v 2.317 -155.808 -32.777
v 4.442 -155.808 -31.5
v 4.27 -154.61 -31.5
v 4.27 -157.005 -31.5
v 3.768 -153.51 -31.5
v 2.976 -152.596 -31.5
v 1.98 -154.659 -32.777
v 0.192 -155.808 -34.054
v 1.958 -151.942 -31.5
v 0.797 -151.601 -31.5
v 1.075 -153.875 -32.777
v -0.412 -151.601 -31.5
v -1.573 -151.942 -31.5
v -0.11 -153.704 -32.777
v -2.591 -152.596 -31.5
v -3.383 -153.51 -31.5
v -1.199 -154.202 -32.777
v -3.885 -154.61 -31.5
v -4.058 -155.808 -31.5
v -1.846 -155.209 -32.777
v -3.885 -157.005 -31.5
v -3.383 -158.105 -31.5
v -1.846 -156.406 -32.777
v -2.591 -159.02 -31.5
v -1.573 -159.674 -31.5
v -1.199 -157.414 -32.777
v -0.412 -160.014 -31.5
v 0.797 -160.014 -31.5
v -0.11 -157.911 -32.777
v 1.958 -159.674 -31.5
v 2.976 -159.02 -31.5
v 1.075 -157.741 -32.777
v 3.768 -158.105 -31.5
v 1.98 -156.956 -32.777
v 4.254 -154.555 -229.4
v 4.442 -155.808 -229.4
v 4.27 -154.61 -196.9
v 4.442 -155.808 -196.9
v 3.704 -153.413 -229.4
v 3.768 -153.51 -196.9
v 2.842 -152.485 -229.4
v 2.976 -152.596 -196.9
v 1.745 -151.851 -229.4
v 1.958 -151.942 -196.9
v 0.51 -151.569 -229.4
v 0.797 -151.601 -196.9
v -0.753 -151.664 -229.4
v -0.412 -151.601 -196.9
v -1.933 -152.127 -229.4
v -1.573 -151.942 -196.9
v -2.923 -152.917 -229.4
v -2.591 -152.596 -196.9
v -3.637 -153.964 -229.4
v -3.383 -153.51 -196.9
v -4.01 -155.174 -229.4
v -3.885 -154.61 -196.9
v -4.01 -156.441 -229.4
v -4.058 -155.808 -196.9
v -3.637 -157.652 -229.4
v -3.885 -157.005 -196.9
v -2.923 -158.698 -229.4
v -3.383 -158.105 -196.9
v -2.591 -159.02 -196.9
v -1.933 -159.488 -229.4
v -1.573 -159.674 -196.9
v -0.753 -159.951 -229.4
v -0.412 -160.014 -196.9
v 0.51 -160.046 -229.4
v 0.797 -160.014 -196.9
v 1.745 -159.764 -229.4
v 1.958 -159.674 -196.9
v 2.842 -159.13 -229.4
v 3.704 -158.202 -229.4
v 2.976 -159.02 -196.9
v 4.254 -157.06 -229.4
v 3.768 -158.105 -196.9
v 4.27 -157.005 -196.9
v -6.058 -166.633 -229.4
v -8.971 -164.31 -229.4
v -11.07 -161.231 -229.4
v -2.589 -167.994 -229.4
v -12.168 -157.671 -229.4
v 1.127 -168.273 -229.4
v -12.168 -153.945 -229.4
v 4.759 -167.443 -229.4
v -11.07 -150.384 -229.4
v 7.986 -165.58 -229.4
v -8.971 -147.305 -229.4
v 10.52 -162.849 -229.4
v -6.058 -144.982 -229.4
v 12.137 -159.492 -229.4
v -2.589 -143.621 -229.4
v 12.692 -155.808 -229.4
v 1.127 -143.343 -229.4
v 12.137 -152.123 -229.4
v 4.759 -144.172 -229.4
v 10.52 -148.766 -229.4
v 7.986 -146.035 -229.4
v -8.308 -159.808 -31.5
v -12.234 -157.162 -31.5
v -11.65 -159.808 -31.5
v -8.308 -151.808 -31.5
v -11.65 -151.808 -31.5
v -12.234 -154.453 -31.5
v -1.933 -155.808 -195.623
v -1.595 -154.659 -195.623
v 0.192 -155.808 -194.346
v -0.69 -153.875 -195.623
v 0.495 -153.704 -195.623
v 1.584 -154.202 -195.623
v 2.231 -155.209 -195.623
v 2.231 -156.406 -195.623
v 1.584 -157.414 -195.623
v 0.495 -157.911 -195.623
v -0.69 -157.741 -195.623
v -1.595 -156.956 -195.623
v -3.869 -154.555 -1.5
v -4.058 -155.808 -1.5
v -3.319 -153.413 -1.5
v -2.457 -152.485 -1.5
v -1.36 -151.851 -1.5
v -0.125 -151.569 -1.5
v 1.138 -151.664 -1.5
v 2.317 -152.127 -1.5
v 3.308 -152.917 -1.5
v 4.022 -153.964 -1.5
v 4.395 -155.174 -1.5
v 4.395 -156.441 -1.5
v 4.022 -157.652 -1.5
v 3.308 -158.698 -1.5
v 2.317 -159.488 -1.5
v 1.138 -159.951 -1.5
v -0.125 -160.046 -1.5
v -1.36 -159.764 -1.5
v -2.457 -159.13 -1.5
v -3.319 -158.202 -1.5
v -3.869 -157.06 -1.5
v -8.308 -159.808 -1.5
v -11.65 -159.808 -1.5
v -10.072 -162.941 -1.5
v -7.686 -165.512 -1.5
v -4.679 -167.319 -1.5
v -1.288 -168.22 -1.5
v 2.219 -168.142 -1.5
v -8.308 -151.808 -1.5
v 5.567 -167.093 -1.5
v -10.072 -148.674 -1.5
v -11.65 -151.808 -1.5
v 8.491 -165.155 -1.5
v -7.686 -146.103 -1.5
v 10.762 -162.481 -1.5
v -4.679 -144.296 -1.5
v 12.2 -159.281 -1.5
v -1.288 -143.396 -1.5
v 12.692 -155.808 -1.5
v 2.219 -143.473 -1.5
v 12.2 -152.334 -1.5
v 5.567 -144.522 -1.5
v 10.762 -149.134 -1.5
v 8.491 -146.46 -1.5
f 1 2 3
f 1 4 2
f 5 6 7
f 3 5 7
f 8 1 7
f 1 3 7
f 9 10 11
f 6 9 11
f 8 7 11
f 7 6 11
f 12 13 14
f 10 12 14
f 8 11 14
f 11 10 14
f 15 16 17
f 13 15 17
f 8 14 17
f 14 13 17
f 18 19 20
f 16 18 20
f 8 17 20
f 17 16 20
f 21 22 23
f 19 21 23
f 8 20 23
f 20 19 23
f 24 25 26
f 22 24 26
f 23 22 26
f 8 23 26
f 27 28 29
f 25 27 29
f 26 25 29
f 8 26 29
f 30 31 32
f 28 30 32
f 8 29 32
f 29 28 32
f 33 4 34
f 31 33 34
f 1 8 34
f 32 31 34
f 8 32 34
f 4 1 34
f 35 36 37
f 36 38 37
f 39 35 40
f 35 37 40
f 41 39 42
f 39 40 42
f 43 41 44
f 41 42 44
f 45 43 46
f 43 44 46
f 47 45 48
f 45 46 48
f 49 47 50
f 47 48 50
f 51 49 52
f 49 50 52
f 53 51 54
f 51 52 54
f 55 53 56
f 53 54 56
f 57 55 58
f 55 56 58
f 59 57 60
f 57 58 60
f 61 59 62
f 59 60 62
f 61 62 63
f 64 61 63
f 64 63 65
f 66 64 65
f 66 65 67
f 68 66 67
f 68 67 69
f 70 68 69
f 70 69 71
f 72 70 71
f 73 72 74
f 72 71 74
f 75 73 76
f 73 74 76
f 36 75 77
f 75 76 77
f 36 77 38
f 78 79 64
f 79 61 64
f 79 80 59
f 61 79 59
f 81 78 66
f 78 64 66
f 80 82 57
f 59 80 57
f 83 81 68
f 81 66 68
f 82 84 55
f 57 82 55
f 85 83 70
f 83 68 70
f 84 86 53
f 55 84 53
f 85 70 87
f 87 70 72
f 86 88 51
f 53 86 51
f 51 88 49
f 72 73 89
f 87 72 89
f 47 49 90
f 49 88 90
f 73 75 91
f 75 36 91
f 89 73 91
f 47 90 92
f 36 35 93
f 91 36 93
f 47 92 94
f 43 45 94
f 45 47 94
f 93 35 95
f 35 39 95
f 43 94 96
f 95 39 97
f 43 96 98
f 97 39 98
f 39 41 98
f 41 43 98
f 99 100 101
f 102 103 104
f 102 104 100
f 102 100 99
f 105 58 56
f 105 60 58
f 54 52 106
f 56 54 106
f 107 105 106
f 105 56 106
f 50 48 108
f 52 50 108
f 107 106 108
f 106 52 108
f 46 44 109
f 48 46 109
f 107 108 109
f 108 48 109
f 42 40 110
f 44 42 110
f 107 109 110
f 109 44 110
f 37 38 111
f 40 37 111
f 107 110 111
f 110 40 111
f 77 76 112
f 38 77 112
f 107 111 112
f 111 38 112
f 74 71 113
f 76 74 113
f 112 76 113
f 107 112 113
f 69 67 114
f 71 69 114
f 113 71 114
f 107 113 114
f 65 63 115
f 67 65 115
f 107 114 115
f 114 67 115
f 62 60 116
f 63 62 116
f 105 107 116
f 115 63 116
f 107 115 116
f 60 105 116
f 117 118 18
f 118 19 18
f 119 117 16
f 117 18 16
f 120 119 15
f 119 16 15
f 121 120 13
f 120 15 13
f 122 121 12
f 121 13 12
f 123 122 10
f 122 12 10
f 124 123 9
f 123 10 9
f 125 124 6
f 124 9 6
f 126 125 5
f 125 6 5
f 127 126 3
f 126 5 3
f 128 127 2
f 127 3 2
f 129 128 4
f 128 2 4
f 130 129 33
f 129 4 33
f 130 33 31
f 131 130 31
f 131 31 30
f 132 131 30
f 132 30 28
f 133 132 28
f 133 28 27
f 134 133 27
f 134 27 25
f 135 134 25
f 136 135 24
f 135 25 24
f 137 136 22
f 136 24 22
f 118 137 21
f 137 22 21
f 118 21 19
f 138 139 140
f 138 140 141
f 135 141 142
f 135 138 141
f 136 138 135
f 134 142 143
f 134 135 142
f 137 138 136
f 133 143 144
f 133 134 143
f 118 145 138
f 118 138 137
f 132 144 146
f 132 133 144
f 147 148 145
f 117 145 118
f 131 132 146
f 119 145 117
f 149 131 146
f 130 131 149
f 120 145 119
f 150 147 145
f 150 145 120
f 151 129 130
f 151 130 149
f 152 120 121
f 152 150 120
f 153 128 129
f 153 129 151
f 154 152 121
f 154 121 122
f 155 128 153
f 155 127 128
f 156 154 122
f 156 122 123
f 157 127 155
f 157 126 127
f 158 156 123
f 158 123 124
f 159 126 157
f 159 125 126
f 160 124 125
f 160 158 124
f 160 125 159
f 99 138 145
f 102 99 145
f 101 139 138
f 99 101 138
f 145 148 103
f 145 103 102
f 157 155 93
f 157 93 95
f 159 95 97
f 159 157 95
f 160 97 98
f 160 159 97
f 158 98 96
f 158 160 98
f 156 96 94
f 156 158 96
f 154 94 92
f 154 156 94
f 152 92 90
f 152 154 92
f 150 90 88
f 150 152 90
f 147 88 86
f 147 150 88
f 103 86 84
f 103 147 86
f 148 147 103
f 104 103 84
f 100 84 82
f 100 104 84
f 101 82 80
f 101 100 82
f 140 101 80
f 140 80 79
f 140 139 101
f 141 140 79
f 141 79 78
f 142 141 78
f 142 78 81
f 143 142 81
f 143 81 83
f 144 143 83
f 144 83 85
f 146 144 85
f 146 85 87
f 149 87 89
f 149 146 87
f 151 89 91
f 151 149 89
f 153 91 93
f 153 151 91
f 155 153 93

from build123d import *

# Parameters (mm, degrees)
EXTRUDE_START          = -1.5
SKETCH_1_R             = 12.5
EXTRUDE_1_DEPTH        = 227.9
HOLE_WIZARD_M101_D     = 8.5
HOLE_WIZARD_M101_DEPTH = 30
HOLE_WIZARD_M101_TIP   = 2.553657631
HOLE_WIZARD_M102_D     = 8.5
HOLE_WIZARD_M102_DEPTH = 32.5
HOLE_WIZARD_M102_TIP   = 2.553657631
SKETCH_6_W             = 8
SKETCH_6_H             = 8
CUT_EXTRUDE_1_DEPTH    = 30


with BuildPart() as part:
    # Эскиз1 → Бобышка-Вытянуть1 (new body)
    with BuildSketch(Plane.XY.offset(EXTRUDE_START)):
        with Locations((0.192463074, -155.807573628)):
            Circle(SKETCH_1_R)
    extrude(amount=-EXTRUDE_1_DEPTH)

    # Отверстие обработанное метчиком M101
    with Locations(Plane.XY.offset(-1.5)):
        with Locations((0.192463074, -155.807573628)):
            Hole(HOLE_WIZARD_M101_D / 2, depth=HOLE_WIZARD_M101_DEPTH)
            with Locations((0, 0, -(HOLE_WIZARD_M101_DEPTH + HOLE_WIZARD_M101_TIP / 2))):  # 118° drill point
                Cone(0, HOLE_WIZARD_M101_D / 2, HOLE_WIZARD_M101_TIP, mode=Mode.SUBTRACT)

    # Отверстие обработанное метчиком M102
    with Locations(Plane(origin=(0, 0, -229.4), x_dir=(-1, 0, 0), z_dir=(0, 0, -1))):
        with Locations((-0.192463074, -155.807573628)):
            Hole(HOLE_WIZARD_M102_D / 2, depth=HOLE_WIZARD_M102_DEPTH)
            with Locations((0, 0, -(HOLE_WIZARD_M102_DEPTH + HOLE_WIZARD_M102_TIP / 2))):  # 118° drill point
                Cone(0, HOLE_WIZARD_M102_D / 2, HOLE_WIZARD_M102_TIP, mode=Mode.SUBTRACT)

    # Эскиз6 → Вырез-Вытянуть1 (cut)
    with BuildSketch(Plane.XY.offset(-1.5)):
        with Locations((-12.307536926, -155.807573628)):
            Rectangle(SKETCH_6_W, SKETCH_6_H)
    extrude(amount=-CUT_EXTRUDE_1_DEPTH, mode=Mode.SUBTRACT)


solid = part.part
